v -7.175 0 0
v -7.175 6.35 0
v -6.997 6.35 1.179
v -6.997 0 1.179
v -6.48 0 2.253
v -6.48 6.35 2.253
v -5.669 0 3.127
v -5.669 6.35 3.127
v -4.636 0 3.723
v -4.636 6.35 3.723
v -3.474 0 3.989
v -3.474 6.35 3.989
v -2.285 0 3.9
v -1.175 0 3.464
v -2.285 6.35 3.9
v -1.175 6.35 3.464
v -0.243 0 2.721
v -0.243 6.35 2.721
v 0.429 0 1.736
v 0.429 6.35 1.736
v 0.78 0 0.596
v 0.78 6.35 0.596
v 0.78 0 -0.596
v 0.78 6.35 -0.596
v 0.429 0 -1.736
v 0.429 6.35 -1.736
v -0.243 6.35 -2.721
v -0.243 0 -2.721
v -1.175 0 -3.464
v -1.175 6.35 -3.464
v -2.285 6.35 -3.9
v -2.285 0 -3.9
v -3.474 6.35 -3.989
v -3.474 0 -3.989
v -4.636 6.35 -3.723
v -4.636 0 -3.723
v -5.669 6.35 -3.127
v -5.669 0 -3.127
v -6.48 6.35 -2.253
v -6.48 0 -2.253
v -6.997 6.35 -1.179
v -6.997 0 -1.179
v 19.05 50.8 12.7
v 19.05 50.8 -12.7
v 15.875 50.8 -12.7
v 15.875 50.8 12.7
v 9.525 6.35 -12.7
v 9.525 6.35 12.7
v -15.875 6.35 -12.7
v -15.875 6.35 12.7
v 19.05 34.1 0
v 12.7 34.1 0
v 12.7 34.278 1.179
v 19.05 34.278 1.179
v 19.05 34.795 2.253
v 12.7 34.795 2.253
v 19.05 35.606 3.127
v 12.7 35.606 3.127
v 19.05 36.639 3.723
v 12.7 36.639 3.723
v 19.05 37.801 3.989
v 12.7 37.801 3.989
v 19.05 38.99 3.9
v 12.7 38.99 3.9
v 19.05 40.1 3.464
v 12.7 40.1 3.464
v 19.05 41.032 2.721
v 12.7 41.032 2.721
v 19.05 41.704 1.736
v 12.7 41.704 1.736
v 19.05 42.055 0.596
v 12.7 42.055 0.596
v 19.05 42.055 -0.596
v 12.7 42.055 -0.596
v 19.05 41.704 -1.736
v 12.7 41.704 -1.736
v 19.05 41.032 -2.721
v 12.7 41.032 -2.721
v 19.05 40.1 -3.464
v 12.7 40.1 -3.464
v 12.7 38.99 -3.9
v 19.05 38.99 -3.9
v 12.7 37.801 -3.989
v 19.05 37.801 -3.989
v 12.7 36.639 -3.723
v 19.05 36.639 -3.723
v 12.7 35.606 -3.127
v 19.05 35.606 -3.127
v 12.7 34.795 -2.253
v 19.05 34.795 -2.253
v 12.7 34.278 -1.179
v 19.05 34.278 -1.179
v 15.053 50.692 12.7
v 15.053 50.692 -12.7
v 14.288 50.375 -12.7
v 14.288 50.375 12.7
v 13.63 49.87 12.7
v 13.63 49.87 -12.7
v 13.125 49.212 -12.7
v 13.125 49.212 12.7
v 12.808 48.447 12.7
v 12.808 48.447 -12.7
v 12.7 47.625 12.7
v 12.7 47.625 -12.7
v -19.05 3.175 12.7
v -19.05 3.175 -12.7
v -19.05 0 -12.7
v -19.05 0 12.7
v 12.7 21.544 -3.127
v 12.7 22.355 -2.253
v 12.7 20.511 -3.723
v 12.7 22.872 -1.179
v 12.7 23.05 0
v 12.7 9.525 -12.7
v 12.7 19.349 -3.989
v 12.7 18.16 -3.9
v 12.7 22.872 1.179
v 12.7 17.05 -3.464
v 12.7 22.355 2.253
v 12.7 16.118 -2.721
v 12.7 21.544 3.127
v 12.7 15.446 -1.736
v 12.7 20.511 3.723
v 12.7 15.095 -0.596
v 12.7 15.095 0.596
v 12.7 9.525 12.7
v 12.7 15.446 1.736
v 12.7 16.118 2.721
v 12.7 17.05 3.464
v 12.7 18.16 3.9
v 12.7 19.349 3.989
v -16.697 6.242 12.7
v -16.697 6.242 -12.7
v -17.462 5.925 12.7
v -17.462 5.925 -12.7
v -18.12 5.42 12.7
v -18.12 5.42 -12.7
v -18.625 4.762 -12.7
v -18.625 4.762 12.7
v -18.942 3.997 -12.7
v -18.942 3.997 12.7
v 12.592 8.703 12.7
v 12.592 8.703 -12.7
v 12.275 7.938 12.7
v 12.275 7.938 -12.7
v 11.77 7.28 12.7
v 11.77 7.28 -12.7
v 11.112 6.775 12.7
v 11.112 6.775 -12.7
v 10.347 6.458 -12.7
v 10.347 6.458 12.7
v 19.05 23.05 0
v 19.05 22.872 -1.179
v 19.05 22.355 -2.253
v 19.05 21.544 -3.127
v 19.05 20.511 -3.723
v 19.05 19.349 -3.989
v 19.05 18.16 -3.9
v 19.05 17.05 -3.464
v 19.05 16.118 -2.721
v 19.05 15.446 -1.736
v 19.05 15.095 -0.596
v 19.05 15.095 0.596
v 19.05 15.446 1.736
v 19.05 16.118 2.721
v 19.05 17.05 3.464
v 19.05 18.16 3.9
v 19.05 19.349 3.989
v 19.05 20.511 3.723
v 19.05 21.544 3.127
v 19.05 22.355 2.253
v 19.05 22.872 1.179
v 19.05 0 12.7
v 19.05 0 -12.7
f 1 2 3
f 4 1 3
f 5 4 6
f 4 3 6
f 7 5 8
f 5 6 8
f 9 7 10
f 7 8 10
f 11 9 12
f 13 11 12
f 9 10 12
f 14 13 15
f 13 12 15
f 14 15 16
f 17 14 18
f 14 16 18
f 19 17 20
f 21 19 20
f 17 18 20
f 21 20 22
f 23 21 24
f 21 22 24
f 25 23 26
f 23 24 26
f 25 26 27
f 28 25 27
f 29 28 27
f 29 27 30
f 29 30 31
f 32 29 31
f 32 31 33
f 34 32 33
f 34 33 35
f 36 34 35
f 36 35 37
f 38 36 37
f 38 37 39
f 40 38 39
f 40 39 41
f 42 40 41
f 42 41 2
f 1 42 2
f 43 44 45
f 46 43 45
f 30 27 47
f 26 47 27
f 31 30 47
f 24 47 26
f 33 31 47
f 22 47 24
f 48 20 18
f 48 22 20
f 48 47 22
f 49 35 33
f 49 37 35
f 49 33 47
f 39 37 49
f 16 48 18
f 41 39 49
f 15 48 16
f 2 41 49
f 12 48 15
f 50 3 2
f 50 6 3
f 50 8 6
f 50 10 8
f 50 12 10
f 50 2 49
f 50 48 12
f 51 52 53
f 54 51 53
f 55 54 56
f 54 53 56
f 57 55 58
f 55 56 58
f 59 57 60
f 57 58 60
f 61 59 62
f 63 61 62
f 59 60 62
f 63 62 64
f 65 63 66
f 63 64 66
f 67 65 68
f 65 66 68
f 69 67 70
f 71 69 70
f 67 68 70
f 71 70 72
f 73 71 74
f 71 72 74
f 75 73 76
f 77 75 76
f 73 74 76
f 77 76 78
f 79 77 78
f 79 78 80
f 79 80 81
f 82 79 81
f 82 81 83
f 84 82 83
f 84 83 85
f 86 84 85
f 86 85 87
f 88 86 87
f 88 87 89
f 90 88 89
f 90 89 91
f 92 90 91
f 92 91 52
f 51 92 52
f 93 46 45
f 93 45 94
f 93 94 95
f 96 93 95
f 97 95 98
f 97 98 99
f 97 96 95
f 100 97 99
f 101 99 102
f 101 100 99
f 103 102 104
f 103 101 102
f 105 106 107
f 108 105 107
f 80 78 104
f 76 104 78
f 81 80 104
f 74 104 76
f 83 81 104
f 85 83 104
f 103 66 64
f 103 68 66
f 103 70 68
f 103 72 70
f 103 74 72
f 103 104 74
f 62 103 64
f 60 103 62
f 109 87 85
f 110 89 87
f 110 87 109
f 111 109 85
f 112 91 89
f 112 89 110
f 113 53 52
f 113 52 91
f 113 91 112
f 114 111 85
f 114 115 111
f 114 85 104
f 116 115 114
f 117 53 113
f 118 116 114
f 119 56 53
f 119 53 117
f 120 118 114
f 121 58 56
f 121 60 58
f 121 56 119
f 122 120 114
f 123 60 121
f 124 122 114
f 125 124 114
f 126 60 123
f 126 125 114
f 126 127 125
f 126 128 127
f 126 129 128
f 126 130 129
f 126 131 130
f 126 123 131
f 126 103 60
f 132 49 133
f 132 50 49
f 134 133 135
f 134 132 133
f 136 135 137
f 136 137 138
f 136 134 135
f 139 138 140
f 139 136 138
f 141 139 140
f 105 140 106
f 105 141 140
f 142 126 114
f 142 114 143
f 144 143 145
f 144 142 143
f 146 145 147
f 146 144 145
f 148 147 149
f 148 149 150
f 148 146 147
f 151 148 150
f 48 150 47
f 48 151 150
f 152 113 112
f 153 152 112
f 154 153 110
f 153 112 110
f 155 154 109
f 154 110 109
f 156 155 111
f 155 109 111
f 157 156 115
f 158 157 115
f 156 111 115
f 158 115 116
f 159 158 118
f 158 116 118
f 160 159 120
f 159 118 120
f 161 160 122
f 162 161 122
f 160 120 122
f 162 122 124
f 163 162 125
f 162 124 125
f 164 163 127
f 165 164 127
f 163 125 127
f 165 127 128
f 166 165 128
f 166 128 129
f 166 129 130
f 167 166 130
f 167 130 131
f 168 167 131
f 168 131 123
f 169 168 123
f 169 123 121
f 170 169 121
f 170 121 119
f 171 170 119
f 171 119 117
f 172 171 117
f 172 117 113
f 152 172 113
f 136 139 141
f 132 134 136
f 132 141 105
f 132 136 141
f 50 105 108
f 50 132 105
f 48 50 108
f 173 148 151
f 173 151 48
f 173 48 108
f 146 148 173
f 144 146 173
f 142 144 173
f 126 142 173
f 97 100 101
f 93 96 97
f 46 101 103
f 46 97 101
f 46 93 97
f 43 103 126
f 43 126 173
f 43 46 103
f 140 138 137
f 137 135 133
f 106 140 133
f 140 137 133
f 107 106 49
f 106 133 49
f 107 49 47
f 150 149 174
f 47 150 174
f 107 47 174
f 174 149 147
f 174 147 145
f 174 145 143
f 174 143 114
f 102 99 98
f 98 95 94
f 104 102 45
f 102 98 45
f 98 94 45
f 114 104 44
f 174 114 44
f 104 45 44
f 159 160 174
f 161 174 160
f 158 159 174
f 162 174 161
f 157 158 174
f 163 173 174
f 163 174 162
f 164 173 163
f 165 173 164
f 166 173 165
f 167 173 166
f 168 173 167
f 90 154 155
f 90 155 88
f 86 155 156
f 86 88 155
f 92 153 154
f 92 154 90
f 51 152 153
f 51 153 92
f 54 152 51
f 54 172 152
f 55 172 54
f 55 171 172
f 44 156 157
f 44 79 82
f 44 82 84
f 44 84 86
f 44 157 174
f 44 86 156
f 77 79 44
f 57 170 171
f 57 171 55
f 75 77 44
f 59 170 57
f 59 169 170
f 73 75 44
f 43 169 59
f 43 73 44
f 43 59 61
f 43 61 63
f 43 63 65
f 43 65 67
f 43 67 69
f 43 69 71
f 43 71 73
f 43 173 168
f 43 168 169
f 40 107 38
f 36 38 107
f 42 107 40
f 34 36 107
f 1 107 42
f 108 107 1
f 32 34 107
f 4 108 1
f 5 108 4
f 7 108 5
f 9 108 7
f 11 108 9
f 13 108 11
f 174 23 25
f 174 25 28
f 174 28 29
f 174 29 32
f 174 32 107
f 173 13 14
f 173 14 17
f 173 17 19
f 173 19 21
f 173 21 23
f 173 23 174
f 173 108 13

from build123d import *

# Parameters (mm, degrees)
BOSS_EXTRUDE1_DEPTH = 12.7
SKETCH3_R           = 4
CUT_EXTRUDE1_DEPTH  = 50.99995
SKETCH4_R           = 4
CUT_EXTRUDE2_DEPTH  = 62.237182332


with BuildPart() as part:
    # Sketch2 → Boss-Extrude1 (new, symmetric)
    with BuildSketch(Plane.XY):
        with BuildLine():
            Line((-19.05, 0), (19.05, 0))
            Line((19.05, 0), (19.05, 50.8))
            Line((19.05, 50.8), (15.875, 50.8))
            ThreePointArc((15.875, 50.8), (13.62993597, 49.87006403), (12.7, 47.625))
            Line((12.7, 47.625), (12.7, 9.525))
            ThreePointArc((12.7, 9.525), (11.77006403, 7.27993597), (9.525, 6.35))
            Line((9.525, 6.35), (-15.875, 6.35))
            ThreePointArc((-15.875, 6.35), (-18.12006403, 5.42006403), (-19.05, 3.175))
            Line((-19.05, 3.175), (-19.05, 0))
        make_face()
    extrude(amount=BOSS_EXTRUDE1_DEPTH, both=True)

    # Sketch3 → Cut-Extrude1 (cut, through all)
    with BuildSketch(Plane(origin=(0, 6.35, 0), x_dir=(1, 0, 0), z_dir=(0, 1, 0))):
        with Locations(Location((-3.175, 0, 0), (0, 0, 180))):
            Circle(SKETCH3_R)
    extrude(amount=-CUT_EXTRUDE1_DEPTH, mode=Mode.SUBTRACT)

    # Sketch4 → Cut-Extrude2 (cut, through all)
    with BuildSketch(Plane.ZY.offset(-12.7)):
        with Locations(Location((0, 38.1, 0), (0, 0, 270))):
            Circle(SKETCH4_R)
        with Locations(Location((0, 19.05, 0), (0, 0, 90))):
            Circle(SKETCH4_R)
    extrude(amount=-CUT_EXTRUDE2_DEPTH, mode=Mode.SUBTRACT)


solid = part.part
